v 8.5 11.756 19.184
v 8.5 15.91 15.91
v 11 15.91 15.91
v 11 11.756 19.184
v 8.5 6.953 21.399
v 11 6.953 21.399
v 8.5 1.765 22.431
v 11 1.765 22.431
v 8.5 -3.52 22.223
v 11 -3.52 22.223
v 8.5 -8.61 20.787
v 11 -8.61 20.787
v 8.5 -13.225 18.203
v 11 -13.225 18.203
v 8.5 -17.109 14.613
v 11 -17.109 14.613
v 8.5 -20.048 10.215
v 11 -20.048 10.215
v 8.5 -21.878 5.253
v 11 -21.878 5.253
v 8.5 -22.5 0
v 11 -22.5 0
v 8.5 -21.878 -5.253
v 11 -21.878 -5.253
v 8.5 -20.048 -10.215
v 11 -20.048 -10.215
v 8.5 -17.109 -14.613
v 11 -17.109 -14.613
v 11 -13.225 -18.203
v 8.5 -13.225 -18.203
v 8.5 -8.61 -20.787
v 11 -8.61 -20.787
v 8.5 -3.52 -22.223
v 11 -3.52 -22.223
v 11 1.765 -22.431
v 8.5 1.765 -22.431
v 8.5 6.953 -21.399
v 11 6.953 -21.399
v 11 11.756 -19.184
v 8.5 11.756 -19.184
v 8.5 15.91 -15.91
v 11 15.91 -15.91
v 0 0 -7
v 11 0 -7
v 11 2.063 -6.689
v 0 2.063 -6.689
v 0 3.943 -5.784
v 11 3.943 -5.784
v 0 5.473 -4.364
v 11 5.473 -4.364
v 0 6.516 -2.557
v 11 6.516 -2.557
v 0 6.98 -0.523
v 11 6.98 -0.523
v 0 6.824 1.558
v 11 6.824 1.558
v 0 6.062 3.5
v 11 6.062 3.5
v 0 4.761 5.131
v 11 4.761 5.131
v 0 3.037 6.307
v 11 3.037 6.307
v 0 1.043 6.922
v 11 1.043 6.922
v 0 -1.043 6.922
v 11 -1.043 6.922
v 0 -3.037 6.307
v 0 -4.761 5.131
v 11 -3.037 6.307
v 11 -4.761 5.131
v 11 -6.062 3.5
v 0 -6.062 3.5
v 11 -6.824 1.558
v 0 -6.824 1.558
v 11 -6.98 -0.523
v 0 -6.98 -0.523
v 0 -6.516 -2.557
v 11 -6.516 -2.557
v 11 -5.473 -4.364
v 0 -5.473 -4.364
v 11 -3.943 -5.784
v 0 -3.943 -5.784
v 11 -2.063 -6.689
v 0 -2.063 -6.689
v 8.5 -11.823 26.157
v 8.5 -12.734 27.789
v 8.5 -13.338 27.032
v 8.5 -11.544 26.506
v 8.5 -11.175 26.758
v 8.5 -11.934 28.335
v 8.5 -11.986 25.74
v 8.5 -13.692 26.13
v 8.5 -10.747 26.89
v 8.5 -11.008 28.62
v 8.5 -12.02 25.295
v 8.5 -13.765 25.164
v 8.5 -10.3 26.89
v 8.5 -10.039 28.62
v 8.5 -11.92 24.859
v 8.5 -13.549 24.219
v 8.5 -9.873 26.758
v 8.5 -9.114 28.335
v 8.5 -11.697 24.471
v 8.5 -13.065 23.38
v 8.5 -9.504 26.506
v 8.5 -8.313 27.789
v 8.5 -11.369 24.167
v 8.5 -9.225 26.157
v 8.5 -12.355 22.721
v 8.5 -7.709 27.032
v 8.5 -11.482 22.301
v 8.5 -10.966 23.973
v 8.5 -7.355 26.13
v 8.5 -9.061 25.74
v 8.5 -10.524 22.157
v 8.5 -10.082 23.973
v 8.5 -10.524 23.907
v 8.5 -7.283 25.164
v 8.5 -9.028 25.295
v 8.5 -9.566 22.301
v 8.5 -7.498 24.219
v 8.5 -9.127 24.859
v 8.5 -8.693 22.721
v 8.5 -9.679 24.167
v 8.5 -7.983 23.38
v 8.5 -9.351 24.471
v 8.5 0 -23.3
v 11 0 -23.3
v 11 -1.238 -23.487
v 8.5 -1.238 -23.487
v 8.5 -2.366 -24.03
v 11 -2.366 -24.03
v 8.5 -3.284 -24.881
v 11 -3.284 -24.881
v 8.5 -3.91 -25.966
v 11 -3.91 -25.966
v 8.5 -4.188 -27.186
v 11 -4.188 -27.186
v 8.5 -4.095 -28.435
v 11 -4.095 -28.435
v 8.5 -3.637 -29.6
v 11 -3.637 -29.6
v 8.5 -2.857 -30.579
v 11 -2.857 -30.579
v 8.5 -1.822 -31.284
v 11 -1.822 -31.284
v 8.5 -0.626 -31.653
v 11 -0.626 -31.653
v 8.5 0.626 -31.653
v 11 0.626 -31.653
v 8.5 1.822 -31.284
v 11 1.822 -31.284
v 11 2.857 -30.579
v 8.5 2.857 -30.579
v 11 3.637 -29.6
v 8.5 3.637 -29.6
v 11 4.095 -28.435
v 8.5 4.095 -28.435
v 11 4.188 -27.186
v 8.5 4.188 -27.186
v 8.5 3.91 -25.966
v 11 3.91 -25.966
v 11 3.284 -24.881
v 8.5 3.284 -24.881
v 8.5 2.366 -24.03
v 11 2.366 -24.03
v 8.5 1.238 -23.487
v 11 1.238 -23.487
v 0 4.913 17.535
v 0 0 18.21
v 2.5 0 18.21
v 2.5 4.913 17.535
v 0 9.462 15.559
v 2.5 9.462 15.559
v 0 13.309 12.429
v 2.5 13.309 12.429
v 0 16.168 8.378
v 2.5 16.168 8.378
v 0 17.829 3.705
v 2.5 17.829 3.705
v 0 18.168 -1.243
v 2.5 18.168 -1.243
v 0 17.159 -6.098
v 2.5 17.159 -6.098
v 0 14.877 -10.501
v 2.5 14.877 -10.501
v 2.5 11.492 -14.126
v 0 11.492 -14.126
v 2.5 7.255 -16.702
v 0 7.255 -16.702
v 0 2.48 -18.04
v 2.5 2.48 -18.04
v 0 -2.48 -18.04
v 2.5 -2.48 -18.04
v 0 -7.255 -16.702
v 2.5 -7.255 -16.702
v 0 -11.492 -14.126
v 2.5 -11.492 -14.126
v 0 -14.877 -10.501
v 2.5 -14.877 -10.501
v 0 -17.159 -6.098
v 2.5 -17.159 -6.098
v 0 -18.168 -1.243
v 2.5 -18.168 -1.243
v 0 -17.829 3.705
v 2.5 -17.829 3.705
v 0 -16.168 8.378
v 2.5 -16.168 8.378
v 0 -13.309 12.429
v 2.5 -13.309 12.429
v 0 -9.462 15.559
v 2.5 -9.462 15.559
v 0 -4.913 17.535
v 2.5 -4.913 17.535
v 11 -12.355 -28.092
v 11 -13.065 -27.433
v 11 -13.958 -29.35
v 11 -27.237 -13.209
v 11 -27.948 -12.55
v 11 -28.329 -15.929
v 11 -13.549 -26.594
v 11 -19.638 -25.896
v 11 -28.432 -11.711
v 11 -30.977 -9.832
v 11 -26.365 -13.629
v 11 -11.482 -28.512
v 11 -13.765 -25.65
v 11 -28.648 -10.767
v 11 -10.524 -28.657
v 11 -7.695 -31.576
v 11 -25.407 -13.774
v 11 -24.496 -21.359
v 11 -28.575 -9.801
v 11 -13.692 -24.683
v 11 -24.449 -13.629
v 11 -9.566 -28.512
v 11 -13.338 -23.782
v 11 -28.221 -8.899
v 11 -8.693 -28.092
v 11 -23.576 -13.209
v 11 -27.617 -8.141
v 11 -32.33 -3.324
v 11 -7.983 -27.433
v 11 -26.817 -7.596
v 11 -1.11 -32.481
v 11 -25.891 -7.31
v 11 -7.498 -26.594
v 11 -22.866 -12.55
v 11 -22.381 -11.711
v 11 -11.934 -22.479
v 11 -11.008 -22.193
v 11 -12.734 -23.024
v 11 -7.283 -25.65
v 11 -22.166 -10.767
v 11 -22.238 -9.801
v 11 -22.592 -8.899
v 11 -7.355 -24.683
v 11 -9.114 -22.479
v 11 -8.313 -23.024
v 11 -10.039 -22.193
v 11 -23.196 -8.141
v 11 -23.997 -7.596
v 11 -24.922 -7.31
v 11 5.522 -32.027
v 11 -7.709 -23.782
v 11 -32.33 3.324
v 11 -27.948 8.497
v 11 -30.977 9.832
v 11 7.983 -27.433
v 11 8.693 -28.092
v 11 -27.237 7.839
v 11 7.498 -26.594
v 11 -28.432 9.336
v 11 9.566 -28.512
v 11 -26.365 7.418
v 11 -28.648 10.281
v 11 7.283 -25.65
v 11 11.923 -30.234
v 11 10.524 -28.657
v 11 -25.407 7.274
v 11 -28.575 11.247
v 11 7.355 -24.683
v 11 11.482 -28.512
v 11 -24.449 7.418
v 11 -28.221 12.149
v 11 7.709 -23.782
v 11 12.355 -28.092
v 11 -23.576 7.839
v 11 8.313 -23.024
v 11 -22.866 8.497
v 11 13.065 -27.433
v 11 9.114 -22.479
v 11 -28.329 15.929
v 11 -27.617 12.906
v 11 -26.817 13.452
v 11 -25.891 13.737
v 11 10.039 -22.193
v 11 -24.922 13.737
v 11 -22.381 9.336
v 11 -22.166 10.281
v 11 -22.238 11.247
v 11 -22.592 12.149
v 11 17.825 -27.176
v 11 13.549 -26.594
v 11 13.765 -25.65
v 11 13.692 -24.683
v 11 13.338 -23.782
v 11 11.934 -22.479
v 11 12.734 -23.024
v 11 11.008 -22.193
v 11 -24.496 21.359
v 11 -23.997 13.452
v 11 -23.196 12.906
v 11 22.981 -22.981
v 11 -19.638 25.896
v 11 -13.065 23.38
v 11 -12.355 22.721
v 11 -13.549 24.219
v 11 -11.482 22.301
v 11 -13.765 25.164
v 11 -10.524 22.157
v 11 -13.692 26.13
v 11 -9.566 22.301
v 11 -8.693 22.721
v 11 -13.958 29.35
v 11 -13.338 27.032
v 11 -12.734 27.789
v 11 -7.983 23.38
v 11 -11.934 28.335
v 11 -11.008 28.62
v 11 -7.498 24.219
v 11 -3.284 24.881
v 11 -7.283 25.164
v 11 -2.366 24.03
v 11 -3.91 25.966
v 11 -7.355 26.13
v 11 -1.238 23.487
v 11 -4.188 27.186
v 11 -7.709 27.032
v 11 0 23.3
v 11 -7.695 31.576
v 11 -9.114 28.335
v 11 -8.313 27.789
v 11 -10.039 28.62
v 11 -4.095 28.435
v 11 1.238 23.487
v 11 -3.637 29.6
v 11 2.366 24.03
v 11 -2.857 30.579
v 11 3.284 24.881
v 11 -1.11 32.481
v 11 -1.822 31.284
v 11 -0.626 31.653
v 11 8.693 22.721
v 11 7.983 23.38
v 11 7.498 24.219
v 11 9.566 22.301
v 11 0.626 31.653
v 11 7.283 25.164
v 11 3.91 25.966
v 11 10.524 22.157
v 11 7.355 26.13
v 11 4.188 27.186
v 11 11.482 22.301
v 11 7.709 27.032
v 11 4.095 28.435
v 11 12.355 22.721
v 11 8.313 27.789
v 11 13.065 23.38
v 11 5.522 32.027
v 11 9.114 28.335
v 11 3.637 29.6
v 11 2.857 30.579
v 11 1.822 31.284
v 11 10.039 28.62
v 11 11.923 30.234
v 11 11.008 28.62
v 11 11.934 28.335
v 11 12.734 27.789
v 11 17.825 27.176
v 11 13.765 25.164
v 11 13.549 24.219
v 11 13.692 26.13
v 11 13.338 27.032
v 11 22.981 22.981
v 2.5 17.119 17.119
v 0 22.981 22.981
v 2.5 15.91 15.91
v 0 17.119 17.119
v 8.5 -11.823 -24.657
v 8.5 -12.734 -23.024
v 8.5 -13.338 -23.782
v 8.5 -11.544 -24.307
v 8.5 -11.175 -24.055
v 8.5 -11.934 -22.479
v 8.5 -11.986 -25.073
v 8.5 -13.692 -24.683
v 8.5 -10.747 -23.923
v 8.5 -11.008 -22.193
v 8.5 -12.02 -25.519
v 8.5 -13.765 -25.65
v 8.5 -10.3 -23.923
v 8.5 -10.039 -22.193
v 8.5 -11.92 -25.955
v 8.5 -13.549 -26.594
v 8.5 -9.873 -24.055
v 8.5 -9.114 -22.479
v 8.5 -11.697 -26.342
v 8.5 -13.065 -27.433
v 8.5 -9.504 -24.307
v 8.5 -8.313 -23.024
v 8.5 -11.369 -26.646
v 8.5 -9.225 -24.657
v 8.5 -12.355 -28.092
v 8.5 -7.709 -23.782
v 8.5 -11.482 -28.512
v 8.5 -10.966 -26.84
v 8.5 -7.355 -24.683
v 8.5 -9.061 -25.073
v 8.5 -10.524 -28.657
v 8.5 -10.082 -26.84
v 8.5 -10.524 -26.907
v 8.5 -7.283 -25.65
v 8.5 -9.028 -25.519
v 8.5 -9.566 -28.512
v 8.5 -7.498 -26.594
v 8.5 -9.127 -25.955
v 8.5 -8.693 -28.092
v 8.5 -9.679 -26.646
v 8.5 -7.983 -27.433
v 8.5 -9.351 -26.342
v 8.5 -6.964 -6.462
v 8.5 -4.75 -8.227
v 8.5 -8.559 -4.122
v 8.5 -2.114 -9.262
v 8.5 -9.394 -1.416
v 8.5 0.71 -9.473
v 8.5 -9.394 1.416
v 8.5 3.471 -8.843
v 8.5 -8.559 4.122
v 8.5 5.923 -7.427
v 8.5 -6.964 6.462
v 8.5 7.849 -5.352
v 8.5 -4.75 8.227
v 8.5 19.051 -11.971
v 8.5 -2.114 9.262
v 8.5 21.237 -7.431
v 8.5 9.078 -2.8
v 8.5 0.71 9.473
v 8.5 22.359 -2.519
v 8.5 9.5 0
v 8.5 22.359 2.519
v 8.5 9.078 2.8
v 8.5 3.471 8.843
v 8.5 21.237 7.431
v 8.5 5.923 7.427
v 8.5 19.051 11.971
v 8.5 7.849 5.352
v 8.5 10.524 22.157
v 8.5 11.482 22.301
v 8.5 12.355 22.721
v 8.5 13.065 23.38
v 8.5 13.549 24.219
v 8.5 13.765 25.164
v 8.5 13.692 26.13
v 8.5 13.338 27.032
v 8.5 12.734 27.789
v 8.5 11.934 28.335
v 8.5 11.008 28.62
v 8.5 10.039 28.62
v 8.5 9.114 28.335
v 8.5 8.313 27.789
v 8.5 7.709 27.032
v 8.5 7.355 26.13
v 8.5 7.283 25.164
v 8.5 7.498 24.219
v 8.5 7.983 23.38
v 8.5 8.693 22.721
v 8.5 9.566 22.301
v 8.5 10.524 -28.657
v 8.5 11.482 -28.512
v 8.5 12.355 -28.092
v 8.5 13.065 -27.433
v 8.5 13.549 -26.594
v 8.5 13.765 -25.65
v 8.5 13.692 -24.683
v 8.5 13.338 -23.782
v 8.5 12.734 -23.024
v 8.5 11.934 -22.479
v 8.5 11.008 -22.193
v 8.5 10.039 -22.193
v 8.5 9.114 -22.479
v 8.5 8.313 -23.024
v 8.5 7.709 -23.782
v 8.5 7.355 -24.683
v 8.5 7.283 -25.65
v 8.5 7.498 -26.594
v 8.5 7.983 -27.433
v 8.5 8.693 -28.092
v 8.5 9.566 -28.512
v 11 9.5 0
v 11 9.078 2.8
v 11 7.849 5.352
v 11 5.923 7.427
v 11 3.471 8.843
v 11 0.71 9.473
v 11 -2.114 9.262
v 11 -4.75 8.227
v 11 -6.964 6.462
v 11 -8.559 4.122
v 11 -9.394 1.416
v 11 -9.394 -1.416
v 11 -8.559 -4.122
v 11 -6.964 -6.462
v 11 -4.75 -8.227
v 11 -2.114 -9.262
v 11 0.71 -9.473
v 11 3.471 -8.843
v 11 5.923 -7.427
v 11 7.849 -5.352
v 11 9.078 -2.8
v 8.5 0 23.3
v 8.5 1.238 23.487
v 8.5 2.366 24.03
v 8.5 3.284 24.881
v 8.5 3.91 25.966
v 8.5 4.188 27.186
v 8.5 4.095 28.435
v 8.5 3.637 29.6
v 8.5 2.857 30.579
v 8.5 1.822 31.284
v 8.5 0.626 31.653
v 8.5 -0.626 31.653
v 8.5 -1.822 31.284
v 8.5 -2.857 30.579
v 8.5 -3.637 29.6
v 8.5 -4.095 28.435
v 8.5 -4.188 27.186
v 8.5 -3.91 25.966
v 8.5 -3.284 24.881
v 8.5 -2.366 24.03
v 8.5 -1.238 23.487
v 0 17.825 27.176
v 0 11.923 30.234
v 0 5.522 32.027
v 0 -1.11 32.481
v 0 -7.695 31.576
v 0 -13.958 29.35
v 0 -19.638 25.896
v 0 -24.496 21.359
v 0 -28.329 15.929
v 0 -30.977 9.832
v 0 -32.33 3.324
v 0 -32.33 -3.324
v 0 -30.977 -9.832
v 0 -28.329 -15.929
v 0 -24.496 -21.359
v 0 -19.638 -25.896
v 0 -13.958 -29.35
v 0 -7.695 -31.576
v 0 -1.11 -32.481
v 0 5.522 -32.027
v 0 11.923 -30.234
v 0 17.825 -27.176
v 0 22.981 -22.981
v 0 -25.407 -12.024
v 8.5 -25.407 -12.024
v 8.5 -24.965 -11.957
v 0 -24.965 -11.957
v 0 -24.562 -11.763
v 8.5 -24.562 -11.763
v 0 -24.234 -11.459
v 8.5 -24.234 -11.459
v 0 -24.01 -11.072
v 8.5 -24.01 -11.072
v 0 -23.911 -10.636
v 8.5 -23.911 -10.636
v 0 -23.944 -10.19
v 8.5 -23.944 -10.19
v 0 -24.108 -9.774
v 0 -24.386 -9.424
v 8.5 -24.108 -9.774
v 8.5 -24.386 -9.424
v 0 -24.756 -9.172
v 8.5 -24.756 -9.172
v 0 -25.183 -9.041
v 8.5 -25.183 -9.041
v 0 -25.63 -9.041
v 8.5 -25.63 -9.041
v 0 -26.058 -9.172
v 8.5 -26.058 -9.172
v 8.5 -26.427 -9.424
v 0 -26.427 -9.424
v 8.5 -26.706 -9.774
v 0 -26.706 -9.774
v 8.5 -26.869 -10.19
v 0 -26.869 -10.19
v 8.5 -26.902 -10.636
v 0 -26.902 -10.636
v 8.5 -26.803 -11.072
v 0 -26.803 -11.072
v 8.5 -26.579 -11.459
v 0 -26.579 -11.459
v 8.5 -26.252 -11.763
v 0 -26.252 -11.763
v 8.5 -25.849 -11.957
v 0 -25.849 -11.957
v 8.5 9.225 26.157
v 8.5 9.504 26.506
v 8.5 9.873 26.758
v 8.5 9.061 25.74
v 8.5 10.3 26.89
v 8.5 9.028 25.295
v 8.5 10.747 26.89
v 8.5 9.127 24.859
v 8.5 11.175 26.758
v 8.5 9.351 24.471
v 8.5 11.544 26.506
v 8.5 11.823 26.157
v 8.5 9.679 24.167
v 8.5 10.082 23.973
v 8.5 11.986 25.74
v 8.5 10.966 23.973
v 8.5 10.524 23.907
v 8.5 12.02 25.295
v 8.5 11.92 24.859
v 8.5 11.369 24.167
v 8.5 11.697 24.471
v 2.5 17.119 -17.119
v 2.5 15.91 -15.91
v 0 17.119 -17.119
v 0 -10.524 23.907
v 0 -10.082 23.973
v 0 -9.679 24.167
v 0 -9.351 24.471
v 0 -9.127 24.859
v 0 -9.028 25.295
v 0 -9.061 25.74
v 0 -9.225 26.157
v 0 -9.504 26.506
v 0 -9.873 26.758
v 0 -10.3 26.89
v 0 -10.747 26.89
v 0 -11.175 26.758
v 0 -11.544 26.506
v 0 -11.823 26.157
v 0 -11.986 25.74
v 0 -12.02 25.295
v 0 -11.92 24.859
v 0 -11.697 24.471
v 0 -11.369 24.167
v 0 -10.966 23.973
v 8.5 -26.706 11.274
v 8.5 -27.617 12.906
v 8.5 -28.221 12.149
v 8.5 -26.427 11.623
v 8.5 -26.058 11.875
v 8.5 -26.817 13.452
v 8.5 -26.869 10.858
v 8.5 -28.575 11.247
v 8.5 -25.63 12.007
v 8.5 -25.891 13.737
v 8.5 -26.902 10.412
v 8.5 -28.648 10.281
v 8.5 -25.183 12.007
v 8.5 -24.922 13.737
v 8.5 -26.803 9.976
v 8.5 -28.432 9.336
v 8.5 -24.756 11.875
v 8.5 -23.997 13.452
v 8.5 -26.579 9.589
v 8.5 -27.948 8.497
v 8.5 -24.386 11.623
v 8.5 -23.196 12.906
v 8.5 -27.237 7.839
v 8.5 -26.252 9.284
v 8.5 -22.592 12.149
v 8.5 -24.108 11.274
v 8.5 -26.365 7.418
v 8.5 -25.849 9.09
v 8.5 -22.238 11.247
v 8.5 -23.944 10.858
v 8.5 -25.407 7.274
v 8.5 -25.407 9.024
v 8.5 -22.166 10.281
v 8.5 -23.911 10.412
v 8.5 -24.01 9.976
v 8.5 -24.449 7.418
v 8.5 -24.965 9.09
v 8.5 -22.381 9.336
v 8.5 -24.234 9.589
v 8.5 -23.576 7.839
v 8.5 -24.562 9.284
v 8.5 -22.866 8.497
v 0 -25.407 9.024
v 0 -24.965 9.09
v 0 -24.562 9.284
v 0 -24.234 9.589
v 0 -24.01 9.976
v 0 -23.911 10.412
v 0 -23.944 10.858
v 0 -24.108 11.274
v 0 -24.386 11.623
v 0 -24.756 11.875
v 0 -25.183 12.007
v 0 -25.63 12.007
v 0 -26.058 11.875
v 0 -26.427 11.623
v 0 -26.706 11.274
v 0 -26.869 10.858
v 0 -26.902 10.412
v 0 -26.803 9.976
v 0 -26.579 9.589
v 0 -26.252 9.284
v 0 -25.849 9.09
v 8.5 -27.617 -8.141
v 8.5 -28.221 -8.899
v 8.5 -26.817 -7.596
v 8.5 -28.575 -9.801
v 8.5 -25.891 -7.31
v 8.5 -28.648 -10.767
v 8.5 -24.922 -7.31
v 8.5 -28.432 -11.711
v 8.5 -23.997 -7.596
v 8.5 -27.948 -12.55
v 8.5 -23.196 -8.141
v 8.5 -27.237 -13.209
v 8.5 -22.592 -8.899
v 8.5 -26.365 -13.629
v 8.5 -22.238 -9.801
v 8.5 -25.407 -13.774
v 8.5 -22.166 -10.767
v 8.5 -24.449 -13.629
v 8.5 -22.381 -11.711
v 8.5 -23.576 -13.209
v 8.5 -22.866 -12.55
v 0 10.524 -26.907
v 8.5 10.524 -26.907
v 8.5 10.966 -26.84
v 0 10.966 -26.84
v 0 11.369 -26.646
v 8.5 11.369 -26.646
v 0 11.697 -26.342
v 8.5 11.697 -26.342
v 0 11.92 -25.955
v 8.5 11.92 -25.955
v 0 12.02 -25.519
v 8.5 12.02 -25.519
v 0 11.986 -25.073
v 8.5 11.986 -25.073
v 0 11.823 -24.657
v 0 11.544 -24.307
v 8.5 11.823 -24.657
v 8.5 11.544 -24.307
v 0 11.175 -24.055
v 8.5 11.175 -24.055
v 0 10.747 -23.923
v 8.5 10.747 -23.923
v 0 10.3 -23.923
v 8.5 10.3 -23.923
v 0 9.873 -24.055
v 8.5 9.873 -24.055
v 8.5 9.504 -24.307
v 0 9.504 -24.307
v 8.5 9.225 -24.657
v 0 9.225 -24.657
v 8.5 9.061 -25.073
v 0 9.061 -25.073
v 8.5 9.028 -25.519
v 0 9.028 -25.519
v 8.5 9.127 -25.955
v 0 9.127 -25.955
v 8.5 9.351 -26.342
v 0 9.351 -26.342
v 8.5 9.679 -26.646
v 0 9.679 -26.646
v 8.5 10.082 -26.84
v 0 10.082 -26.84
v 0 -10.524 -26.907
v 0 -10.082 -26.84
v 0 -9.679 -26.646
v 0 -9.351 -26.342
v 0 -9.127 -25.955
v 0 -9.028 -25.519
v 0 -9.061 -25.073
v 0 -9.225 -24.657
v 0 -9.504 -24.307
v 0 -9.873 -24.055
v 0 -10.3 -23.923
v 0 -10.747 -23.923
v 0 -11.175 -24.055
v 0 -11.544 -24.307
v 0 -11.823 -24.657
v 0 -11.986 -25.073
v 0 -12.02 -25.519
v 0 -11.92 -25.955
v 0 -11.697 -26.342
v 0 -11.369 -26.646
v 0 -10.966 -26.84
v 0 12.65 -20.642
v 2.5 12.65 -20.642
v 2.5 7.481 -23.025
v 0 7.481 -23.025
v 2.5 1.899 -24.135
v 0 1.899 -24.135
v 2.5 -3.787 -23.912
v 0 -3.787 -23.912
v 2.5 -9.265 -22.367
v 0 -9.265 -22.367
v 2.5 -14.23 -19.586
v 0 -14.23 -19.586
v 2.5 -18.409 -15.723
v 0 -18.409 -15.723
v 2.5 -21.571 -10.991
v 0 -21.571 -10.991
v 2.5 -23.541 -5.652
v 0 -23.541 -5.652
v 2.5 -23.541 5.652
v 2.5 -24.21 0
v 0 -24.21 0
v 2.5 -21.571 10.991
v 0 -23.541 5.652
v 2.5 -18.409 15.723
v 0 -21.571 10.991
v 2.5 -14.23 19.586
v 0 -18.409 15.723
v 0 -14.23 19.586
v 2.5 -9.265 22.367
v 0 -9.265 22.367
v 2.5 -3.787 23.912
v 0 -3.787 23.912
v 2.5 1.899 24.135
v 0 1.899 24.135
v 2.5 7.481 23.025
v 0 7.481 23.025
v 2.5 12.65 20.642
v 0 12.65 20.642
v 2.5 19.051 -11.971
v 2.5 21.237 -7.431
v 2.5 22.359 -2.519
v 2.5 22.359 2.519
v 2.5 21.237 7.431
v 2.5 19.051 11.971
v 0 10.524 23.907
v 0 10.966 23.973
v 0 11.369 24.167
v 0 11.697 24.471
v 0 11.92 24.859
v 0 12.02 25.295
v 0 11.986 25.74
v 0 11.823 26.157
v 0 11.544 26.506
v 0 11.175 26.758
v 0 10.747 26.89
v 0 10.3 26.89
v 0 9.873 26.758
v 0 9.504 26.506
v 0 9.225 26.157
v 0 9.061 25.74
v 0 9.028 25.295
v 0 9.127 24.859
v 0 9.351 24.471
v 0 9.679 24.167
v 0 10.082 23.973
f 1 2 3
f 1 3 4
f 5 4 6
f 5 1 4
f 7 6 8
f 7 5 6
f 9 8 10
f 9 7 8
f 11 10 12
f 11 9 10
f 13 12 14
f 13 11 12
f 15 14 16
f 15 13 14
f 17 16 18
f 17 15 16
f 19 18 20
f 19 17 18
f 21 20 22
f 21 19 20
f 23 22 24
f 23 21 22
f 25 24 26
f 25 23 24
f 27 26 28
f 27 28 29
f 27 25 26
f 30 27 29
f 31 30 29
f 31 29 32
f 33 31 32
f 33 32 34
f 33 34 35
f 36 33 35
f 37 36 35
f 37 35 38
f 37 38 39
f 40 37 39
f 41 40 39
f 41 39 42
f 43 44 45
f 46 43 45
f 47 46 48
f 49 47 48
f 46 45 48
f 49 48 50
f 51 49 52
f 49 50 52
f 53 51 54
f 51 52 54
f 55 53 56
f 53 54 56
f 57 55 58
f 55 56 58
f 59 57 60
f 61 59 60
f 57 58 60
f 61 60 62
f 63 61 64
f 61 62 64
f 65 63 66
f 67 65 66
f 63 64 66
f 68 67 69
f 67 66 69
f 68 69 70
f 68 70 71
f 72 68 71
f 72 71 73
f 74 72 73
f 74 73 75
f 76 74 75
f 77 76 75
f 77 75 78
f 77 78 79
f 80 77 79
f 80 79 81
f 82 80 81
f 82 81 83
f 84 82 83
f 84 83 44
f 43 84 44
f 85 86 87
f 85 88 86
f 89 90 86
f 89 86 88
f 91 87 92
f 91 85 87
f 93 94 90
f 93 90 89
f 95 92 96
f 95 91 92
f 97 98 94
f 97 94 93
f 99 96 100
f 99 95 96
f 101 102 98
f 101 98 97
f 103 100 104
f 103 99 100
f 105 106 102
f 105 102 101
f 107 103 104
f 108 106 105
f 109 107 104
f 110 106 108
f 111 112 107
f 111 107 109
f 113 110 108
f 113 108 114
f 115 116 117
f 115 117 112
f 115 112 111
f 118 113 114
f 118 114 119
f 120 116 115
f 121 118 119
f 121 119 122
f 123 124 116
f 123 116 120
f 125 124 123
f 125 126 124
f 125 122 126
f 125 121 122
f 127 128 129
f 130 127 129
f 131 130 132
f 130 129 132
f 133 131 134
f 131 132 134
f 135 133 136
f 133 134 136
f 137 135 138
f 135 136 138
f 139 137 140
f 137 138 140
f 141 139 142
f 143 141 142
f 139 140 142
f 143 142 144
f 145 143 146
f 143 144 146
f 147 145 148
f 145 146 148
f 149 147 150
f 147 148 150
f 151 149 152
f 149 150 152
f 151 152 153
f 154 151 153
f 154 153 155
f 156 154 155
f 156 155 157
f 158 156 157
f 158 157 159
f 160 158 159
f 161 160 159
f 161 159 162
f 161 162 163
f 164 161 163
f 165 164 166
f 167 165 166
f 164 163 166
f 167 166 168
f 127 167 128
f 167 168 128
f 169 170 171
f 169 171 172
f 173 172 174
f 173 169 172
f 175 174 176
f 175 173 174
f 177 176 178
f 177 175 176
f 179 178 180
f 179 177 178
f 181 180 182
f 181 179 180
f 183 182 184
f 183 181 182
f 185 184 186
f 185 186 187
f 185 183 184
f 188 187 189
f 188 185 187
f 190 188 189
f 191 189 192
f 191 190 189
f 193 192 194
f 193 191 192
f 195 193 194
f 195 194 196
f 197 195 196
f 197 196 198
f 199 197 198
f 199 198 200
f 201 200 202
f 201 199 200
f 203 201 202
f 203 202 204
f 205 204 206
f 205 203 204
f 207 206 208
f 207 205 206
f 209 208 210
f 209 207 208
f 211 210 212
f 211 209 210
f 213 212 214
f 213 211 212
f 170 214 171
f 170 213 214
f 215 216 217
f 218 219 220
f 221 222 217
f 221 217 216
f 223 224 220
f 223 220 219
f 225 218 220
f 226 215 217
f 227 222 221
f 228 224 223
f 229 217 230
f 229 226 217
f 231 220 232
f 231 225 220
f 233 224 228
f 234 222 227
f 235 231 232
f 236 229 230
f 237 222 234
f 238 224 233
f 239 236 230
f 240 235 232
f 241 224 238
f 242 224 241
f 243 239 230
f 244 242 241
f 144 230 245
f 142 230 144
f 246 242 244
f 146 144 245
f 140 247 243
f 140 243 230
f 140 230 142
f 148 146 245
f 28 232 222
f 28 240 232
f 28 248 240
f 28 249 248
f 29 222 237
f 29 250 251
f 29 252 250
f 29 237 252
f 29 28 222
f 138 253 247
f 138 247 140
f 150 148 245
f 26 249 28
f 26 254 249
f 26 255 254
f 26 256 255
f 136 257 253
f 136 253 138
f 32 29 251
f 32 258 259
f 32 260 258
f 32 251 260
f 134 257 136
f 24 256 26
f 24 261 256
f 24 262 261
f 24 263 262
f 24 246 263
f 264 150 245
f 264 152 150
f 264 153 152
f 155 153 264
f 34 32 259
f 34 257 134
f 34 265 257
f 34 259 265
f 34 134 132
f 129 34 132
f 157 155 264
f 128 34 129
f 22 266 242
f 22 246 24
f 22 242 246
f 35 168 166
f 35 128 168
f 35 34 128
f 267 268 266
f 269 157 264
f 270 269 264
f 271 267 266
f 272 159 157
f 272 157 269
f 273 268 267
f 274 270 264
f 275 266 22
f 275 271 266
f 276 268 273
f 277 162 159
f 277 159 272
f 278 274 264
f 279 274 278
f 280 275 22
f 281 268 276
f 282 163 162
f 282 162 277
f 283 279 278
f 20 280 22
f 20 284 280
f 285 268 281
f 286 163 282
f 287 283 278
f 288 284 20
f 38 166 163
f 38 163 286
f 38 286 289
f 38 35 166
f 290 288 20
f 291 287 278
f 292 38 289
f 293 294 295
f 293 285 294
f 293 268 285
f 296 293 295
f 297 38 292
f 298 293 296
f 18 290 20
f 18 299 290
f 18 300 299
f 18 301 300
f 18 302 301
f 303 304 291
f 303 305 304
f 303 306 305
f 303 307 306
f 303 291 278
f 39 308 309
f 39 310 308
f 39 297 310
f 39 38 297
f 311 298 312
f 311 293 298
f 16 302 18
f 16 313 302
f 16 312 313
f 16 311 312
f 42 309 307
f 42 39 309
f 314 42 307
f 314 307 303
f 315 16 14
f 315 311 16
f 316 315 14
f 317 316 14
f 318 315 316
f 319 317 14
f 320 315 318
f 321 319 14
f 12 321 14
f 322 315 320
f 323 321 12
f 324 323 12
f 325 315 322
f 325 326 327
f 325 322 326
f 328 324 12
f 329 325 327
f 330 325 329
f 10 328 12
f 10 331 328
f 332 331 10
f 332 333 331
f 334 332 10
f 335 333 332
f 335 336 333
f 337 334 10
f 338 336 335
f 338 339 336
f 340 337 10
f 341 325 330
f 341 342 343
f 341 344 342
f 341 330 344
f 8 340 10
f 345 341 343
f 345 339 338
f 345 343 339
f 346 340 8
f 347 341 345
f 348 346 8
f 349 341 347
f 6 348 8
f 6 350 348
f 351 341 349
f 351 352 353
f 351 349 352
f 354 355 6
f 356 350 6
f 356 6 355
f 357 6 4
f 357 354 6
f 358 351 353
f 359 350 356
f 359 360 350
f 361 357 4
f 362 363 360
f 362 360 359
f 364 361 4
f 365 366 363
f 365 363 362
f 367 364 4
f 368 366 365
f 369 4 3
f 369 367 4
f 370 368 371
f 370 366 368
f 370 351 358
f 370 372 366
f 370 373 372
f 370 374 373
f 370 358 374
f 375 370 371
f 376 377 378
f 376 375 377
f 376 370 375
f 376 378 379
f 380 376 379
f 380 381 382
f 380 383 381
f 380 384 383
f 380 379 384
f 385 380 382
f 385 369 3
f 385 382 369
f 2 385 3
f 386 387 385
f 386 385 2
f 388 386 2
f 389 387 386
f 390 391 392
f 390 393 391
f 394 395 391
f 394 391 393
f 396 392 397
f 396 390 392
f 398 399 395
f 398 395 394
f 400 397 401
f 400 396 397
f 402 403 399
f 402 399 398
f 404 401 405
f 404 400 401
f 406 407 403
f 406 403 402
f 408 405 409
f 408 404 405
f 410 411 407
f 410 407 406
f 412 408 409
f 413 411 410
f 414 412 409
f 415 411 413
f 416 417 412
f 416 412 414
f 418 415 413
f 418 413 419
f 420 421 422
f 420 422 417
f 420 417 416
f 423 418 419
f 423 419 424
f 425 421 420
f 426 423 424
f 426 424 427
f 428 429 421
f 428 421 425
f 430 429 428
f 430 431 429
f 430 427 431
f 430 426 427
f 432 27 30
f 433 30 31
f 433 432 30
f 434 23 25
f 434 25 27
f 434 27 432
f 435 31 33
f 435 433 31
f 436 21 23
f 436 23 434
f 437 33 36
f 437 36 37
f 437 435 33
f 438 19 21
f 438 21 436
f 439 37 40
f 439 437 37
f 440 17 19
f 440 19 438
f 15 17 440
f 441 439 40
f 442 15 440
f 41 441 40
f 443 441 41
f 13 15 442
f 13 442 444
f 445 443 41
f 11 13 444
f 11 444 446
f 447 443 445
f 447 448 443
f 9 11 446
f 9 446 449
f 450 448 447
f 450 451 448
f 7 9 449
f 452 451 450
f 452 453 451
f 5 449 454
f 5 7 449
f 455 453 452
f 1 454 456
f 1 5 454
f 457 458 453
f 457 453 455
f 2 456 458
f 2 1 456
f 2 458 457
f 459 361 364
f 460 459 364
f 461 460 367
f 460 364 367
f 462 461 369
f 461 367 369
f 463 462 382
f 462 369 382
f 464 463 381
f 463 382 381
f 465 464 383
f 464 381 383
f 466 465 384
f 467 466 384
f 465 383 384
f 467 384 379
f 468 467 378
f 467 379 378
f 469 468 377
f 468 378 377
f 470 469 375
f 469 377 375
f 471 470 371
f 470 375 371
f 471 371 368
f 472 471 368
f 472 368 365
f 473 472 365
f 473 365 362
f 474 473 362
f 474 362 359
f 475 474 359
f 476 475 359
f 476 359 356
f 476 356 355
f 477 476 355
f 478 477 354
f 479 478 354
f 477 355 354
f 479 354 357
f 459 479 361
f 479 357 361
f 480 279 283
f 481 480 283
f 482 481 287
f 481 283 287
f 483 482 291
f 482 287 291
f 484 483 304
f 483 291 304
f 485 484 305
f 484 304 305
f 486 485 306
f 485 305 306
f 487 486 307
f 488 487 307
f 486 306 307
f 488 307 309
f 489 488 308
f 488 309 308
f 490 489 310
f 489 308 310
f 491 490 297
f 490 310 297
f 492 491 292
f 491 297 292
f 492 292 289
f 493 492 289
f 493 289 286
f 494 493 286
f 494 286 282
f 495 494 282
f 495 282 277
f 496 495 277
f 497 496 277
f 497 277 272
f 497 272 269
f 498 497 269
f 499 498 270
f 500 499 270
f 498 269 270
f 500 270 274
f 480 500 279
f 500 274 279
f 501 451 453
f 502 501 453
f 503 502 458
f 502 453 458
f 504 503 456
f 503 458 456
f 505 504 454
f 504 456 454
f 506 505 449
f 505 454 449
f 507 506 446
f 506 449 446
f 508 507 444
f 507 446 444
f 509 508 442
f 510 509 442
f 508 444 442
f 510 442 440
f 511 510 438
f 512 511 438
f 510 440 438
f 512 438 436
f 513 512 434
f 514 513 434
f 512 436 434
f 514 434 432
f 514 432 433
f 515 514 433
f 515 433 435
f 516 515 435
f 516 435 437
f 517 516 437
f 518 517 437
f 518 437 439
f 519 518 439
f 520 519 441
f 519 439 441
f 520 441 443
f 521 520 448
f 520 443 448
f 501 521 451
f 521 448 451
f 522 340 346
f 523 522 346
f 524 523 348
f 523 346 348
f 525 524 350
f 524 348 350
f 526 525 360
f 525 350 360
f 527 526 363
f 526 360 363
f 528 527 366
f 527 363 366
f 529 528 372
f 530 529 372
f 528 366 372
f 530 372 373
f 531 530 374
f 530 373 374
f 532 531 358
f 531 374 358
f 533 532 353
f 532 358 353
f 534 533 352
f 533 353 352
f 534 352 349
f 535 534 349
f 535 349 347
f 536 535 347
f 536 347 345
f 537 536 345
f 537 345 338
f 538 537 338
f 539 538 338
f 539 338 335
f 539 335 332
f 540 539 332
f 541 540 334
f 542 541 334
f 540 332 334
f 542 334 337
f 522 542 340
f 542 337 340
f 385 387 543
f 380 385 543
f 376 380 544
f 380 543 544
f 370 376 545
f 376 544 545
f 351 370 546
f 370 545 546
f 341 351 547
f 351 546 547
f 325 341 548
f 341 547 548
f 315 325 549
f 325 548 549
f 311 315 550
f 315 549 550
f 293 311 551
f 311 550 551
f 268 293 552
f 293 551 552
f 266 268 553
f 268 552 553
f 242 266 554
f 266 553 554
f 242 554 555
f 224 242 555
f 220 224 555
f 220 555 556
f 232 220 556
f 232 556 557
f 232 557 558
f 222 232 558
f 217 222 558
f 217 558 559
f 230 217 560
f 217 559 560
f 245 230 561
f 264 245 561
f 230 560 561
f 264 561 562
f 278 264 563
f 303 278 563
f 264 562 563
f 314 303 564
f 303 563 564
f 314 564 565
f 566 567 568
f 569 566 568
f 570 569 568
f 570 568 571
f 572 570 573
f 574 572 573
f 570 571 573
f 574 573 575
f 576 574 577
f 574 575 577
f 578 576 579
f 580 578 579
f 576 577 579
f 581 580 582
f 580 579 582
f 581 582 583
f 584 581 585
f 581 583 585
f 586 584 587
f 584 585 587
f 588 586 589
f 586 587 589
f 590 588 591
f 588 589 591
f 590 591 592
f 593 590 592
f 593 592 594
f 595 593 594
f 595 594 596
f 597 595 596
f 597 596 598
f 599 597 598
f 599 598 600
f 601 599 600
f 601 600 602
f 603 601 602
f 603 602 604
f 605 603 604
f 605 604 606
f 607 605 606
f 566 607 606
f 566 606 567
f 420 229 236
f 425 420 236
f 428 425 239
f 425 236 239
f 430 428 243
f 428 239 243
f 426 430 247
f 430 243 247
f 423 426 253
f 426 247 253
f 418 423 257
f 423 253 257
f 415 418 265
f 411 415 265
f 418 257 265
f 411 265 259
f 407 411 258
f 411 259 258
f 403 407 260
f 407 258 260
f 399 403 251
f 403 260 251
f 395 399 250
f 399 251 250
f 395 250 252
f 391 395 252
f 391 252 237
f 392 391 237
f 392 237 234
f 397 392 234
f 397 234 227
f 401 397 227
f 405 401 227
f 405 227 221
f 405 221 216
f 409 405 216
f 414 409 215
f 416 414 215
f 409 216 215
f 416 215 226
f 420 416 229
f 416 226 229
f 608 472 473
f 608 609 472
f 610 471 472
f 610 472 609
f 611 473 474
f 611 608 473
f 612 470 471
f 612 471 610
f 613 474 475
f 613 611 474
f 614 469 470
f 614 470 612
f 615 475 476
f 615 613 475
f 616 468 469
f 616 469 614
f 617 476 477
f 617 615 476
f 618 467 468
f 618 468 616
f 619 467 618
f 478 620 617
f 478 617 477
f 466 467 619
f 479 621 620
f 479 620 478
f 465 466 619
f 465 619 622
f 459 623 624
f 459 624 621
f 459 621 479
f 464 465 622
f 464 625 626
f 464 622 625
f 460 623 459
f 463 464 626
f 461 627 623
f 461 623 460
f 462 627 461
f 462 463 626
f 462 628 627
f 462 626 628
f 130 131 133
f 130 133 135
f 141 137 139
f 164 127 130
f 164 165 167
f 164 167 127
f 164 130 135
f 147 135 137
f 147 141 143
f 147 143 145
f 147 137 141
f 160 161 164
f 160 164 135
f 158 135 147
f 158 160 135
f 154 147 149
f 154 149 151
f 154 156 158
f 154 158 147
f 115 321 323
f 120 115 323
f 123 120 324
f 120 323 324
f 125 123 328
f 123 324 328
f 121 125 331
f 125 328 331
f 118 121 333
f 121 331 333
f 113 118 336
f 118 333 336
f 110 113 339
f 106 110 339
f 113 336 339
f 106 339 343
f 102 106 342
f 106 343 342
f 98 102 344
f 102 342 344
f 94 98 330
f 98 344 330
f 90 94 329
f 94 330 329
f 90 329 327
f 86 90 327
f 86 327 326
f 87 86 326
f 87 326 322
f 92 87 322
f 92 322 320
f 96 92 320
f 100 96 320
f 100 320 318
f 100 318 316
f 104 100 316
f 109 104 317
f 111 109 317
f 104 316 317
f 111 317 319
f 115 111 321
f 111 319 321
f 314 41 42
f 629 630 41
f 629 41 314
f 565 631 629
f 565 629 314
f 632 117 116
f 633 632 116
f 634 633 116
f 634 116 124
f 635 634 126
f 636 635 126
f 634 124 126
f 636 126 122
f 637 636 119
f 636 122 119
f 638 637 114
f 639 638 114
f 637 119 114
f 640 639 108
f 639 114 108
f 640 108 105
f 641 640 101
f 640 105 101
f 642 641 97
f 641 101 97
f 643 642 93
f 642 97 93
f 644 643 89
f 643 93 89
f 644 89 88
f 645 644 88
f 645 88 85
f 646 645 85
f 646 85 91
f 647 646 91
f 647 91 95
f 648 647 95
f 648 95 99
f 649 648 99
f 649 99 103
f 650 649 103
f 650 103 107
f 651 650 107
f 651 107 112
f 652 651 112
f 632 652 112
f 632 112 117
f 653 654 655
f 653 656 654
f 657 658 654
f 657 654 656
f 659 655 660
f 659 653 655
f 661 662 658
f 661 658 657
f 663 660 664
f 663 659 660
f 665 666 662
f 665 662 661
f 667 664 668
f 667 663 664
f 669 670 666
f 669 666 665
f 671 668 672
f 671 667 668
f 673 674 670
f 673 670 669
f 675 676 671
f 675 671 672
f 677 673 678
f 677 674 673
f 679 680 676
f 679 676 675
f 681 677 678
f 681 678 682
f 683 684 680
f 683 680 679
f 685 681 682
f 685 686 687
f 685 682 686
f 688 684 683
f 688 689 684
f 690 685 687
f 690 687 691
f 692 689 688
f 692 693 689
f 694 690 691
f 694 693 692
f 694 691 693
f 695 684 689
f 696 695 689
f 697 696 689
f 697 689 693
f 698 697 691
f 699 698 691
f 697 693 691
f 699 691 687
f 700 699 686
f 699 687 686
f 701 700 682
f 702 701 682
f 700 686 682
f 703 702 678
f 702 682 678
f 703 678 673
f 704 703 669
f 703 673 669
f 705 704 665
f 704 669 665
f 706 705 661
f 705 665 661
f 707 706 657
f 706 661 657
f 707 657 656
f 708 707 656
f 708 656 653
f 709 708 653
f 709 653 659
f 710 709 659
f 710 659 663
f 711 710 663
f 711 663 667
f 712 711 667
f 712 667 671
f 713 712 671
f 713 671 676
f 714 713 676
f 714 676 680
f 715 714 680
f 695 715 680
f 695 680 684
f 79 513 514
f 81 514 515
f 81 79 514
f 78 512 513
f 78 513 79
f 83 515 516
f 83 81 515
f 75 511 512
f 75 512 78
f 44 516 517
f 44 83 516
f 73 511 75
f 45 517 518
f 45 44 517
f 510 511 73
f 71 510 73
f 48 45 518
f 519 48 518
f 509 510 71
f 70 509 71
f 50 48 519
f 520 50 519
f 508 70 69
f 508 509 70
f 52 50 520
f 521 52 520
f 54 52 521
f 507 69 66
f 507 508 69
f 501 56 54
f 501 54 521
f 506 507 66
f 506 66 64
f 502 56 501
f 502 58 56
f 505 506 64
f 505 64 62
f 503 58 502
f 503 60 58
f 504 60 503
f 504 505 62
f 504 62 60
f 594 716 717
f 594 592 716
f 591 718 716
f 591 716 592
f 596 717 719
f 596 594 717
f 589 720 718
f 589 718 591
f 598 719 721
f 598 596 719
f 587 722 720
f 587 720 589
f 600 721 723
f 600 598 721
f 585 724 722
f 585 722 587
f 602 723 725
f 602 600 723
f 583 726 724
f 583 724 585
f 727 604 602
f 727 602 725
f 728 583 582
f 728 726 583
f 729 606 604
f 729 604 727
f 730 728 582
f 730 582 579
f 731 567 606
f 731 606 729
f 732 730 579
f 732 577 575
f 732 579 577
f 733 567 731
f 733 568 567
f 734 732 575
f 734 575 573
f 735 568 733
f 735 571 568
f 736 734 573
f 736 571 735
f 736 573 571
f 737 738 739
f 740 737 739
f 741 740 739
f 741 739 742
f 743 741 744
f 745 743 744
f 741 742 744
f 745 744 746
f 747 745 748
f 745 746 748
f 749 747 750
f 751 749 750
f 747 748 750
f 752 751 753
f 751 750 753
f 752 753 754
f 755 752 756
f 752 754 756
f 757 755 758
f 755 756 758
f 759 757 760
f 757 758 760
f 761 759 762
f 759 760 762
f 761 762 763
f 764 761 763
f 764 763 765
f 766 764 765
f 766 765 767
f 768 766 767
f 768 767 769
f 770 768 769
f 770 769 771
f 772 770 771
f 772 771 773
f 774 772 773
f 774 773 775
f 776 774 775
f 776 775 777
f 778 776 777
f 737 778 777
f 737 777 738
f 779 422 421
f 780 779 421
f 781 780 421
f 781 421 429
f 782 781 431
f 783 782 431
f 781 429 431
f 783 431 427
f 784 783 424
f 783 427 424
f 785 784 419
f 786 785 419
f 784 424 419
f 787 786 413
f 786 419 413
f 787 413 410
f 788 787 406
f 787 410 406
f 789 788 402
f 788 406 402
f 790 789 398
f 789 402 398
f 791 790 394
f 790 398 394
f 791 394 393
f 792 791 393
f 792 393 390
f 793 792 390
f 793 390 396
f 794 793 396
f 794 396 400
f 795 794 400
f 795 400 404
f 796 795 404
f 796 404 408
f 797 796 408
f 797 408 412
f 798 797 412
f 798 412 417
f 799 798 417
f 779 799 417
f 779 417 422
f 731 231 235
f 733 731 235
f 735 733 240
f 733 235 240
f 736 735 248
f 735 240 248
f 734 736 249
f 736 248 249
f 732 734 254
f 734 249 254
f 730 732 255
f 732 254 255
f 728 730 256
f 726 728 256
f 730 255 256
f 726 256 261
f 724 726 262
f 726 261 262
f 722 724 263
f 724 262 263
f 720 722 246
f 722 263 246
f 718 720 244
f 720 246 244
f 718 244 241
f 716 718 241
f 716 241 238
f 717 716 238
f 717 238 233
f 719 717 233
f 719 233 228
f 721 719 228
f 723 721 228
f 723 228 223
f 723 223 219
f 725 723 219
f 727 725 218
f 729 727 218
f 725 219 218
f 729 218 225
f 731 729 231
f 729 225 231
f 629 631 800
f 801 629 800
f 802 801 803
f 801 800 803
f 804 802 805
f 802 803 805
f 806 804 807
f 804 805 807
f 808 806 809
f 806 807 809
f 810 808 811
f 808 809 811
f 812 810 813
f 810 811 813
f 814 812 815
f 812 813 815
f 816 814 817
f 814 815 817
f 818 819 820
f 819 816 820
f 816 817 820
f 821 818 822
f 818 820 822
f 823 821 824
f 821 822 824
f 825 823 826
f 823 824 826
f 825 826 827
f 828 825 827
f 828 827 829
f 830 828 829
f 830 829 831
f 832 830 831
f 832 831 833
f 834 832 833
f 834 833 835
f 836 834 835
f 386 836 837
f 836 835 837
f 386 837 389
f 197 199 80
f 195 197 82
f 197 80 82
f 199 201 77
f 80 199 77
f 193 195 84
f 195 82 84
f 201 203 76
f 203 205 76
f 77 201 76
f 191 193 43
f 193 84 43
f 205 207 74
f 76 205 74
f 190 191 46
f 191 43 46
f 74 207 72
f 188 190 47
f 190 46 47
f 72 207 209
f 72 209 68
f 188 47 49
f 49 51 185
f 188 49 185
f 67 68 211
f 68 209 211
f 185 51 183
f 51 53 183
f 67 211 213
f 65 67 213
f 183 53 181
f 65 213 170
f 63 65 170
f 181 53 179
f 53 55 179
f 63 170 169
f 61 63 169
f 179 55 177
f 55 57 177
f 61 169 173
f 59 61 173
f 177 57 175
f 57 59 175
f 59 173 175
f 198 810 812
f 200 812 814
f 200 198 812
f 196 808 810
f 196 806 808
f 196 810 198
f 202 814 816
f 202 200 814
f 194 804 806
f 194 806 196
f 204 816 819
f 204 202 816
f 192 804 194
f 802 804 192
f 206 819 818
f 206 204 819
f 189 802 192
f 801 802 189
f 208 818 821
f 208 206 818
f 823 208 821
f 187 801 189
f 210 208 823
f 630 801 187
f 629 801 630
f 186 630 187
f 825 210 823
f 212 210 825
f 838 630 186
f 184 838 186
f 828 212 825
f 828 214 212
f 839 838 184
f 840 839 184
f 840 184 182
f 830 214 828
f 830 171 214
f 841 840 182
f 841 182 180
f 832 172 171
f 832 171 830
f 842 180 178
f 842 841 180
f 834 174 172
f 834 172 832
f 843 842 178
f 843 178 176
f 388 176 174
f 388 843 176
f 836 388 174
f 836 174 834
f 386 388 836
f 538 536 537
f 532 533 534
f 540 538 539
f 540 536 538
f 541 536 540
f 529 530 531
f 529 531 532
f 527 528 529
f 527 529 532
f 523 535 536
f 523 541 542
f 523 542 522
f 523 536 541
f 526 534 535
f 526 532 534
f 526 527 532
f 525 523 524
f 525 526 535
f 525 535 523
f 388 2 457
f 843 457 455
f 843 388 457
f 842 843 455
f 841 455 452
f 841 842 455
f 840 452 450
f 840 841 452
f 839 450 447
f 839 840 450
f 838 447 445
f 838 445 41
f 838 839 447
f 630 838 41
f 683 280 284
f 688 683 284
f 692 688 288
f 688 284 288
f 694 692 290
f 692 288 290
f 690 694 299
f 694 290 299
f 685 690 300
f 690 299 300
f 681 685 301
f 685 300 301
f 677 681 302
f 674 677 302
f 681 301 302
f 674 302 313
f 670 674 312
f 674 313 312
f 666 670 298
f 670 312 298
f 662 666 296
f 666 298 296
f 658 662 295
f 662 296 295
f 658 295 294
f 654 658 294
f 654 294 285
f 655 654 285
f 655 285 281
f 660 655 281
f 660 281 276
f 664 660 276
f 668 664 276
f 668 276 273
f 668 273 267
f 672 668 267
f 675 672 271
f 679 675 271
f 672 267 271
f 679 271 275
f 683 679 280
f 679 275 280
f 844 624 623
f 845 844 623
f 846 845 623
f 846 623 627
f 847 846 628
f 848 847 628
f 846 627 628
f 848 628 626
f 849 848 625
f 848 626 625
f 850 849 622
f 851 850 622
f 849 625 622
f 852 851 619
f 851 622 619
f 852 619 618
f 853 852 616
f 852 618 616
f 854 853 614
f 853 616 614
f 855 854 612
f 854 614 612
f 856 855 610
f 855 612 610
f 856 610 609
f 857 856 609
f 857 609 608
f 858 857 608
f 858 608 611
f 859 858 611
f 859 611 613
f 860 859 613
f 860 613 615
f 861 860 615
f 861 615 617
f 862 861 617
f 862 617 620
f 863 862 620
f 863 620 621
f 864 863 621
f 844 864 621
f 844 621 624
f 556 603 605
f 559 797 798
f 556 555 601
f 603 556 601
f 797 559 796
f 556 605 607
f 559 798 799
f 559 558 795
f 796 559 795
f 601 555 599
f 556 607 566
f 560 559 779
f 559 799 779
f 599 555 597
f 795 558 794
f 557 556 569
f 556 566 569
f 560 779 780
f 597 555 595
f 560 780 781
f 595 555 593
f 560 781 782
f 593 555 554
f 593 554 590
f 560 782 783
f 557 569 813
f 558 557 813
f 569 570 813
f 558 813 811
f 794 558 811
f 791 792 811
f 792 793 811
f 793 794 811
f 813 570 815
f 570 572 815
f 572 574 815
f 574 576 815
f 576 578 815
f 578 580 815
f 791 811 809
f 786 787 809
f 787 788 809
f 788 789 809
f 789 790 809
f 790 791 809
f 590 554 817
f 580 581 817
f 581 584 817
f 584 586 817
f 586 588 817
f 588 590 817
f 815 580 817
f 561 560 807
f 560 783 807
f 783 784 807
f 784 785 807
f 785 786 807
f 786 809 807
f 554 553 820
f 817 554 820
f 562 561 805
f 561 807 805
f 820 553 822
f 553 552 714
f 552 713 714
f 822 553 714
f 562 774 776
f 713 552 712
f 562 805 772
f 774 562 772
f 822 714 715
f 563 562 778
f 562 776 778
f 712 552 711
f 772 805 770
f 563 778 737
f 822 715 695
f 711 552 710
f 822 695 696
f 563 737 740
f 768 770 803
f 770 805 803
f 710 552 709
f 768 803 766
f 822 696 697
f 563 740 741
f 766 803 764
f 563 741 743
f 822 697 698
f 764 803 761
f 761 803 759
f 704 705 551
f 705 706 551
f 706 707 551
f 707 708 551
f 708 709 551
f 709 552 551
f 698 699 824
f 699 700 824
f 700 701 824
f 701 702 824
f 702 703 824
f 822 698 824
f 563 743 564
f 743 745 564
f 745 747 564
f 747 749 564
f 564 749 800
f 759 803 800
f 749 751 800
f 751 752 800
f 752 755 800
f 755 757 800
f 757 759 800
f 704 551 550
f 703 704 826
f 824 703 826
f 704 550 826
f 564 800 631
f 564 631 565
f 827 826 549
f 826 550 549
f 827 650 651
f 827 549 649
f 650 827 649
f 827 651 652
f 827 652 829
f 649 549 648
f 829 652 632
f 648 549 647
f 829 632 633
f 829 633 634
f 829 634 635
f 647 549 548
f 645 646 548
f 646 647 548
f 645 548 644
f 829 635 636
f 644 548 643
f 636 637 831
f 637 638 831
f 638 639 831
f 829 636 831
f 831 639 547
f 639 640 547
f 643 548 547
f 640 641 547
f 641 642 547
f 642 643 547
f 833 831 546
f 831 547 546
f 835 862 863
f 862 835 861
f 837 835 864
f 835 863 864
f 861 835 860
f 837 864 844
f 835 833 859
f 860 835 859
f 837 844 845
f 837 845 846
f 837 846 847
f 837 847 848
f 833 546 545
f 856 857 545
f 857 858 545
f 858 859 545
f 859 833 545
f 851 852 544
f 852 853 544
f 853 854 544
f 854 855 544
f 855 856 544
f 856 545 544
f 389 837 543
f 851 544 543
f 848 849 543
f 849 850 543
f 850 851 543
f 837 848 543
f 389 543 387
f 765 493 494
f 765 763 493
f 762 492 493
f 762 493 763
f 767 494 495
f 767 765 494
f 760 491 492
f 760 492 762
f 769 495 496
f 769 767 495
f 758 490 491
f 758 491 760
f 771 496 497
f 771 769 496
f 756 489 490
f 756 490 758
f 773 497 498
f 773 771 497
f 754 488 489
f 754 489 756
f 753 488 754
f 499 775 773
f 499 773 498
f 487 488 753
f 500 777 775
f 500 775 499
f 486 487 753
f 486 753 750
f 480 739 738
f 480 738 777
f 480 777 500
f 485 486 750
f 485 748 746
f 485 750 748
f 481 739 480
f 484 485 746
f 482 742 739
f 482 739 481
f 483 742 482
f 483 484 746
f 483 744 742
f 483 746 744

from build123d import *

# Parameters (mm, degrees)
REVOLUCI_N1_OUTLINE_R     = 32.5
REVOLUCI_N1_DEPTH         = 8.5
REVOLUCI_N1_START         = 8.5
REVOLUCI_N1_2_OUTLINE_R   = 32.5
REVOLUCI_N1_2_OUTLINE_R_2 = 22.5
REVOLUCI_N1_2_OUTLINE_R_3 = 9.5
REVOLUCI_N1_2_DEPTH       = 2.5
CROQUIS2_R                = 7
CROQUIS2_R_2              = 1.5
CORTAR_EXTRUIR1_DEPTH     = 16
CORTAR_EXTRUIR2_START     = -16
CORTAR_EXTRUIR2_DEPTH     = 16
CORTAR_EXTRUIR4_DEPTH     = 2.5
CROQUIS7_R                = 3.25
CORTAR_EXTRUIR6_DEPTH     = 2.5
CROQUIS9_R                = 24.21
CROQUIS9_R_2              = 18.21
CORTAR_EXTRUIR7_DEPTH     = 2.5


# Read off the part's stored shape, not the designer's step: Revolución1
with BuildPart() as part:
    # Revolución1 outline → Revolución1 (new body)
    with BuildSketch(Plane.YZ):
        Circle(REVOLUCI_N1_OUTLINE_R)
    extrude(amount=REVOLUCI_N1_DEPTH)

    # Revoluci_n1 2 outline → Revoluci_n1 2 (add)
    # profile 1 of 2: a face of its own
    with BuildSketch(Plane.YZ.offset(REVOLUCI_N1_START)):
        Circle(REVOLUCI_N1_2_OUTLINE_R)
        Circle(REVOLUCI_N1_2_OUTLINE_R_2, mode=Mode.SUBTRACT)
    # profile 2 of 2: a face of its own
    with BuildSketch(Plane.YZ.offset(REVOLUCI_N1_START)):
        Circle(REVOLUCI_N1_2_OUTLINE_R_3)
    extrude(amount=REVOLUCI_N1_2_DEPTH)

    # Croquis2 → Cortar-Extruir1 (cut)
    with BuildSketch(Plane(origin=(11, 0, 0), x_dir=(0, 0, -1), z_dir=(1, 0, 0))):
        Circle(CROQUIS2_R)
        with Locations((25.406687144, -10.52379439)):
            Circle(CROQUIS2_R_2)
        with Locations((10.52379439, -25.406687144)):
            Circle(CROQUIS2_R_2)
        with Locations((-10.52379439, -25.406687144)):
            Circle(CROQUIS2_R_2)
        with Locations((-25.406687144, -10.52379439)):
            Circle(CROQUIS2_R_2)
        with Locations((-25.406687144, 10.52379439)):
            Circle(CROQUIS2_R_2)
        with Locations((25.406687144, 10.52379439)):
            Circle(CROQUIS2_R_2)
    extrude(amount=-CORTAR_EXTRUIR1_DEPTH, mode=Mode.SUBTRACT)

    # Croquis3 → Cortar-Extruir2 (cut)
    with BuildSketch(Plane(origin=(11, 0, 0), x_dir=(0, 0, -1), z_dir=(1, 0, 0)).offset(CORTAR_EXTRUIR2_START)):
        with BuildLine():
            Line((-22.980970389, 22.980970389), (-15.909902577, 15.909902577))
            ThreePointArc((-15.909902577, 15.909902577), (0, 22.5), (15.909902577, 15.909902577))
            Line((15.909902577, 15.909902577), (22.980970389, 22.980970389))
            ThreePointArc((22.980970389, 22.980970389), (0, 32.5), (-22.980970389, 22.980970389))
        make_face()
    extrude(amount=CORTAR_EXTRUIR2_DEPTH, mode=Mode.SUBTRACT)

    # Croquis5 → Cortar-Extruir4 (cut)
    with BuildSketch(Plane(origin=(11, 0, 0), x_dir=(0, 0, -1), z_dir=(1, 0, 0))):
        with BuildLine():
            ThreePointArc((31.7, 0), (27.5, 4.2), (23.3, 0))
            Line((23.3, 0), (31.7, 0))
        make_face()
        with BuildLine():
            Line((31.7, 0), (23.3, 0))
            ThreePointArc((23.3, 0), (27.5, -4.2), (31.7, 0))
        make_face()
        with BuildLine():
            ThreePointArc((-31.7, 0), (-27.5, -4.2), (-23.3, 0))
            Line((-23.3, 0), (-31.7, 0))
        make_face()
        with BuildLine():
            Line((-31.7, 0), (-23.3, 0))
            ThreePointArc((-23.3, 0), (-27.5, 4.2), (-31.7, 0))
        make_face()
    extrude(amount=-CORTAR_EXTRUIR4_DEPTH, mode=Mode.SUBTRACT)

    # Croquis7 → Cortar-Extruir6 (cut)
    with BuildSketch(Plane(origin=(11, 0, 0), x_dir=(0, 0, -1), z_dir=(1, 0, 0))):
        with Locations((25.406687144, -10.52379439)):
            Circle(CROQUIS7_R)
        with Locations((10.52379439, -25.406687144)):
            Circle(CROQUIS7_R)
        with Locations((-10.52379439, -25.406687144)):
            Circle(CROQUIS7_R)
        with Locations((-25.406687144, -10.52379439)):
            Circle(CROQUIS7_R)
        with Locations((-25.406687144, 10.52379439)):
            Circle(CROQUIS7_R)
        with Locations((25.406687144, 10.52379439)):
            Circle(CROQUIS7_R)
    extrude(amount=-CORTAR_EXTRUIR6_DEPTH, mode=Mode.SUBTRACT)

    # Croquis9 → Cortar-Extruir7 (cut)
    with BuildSketch(Plane.ZY):
        Circle(CROQUIS9_R)
        Circle(CROQUIS9_R_2, mode=Mode.SUBTRACT)
    extrude(amount=-CORTAR_EXTRUIR7_DEPTH, mode=Mode.SUBTRACT)


solid = part.part
